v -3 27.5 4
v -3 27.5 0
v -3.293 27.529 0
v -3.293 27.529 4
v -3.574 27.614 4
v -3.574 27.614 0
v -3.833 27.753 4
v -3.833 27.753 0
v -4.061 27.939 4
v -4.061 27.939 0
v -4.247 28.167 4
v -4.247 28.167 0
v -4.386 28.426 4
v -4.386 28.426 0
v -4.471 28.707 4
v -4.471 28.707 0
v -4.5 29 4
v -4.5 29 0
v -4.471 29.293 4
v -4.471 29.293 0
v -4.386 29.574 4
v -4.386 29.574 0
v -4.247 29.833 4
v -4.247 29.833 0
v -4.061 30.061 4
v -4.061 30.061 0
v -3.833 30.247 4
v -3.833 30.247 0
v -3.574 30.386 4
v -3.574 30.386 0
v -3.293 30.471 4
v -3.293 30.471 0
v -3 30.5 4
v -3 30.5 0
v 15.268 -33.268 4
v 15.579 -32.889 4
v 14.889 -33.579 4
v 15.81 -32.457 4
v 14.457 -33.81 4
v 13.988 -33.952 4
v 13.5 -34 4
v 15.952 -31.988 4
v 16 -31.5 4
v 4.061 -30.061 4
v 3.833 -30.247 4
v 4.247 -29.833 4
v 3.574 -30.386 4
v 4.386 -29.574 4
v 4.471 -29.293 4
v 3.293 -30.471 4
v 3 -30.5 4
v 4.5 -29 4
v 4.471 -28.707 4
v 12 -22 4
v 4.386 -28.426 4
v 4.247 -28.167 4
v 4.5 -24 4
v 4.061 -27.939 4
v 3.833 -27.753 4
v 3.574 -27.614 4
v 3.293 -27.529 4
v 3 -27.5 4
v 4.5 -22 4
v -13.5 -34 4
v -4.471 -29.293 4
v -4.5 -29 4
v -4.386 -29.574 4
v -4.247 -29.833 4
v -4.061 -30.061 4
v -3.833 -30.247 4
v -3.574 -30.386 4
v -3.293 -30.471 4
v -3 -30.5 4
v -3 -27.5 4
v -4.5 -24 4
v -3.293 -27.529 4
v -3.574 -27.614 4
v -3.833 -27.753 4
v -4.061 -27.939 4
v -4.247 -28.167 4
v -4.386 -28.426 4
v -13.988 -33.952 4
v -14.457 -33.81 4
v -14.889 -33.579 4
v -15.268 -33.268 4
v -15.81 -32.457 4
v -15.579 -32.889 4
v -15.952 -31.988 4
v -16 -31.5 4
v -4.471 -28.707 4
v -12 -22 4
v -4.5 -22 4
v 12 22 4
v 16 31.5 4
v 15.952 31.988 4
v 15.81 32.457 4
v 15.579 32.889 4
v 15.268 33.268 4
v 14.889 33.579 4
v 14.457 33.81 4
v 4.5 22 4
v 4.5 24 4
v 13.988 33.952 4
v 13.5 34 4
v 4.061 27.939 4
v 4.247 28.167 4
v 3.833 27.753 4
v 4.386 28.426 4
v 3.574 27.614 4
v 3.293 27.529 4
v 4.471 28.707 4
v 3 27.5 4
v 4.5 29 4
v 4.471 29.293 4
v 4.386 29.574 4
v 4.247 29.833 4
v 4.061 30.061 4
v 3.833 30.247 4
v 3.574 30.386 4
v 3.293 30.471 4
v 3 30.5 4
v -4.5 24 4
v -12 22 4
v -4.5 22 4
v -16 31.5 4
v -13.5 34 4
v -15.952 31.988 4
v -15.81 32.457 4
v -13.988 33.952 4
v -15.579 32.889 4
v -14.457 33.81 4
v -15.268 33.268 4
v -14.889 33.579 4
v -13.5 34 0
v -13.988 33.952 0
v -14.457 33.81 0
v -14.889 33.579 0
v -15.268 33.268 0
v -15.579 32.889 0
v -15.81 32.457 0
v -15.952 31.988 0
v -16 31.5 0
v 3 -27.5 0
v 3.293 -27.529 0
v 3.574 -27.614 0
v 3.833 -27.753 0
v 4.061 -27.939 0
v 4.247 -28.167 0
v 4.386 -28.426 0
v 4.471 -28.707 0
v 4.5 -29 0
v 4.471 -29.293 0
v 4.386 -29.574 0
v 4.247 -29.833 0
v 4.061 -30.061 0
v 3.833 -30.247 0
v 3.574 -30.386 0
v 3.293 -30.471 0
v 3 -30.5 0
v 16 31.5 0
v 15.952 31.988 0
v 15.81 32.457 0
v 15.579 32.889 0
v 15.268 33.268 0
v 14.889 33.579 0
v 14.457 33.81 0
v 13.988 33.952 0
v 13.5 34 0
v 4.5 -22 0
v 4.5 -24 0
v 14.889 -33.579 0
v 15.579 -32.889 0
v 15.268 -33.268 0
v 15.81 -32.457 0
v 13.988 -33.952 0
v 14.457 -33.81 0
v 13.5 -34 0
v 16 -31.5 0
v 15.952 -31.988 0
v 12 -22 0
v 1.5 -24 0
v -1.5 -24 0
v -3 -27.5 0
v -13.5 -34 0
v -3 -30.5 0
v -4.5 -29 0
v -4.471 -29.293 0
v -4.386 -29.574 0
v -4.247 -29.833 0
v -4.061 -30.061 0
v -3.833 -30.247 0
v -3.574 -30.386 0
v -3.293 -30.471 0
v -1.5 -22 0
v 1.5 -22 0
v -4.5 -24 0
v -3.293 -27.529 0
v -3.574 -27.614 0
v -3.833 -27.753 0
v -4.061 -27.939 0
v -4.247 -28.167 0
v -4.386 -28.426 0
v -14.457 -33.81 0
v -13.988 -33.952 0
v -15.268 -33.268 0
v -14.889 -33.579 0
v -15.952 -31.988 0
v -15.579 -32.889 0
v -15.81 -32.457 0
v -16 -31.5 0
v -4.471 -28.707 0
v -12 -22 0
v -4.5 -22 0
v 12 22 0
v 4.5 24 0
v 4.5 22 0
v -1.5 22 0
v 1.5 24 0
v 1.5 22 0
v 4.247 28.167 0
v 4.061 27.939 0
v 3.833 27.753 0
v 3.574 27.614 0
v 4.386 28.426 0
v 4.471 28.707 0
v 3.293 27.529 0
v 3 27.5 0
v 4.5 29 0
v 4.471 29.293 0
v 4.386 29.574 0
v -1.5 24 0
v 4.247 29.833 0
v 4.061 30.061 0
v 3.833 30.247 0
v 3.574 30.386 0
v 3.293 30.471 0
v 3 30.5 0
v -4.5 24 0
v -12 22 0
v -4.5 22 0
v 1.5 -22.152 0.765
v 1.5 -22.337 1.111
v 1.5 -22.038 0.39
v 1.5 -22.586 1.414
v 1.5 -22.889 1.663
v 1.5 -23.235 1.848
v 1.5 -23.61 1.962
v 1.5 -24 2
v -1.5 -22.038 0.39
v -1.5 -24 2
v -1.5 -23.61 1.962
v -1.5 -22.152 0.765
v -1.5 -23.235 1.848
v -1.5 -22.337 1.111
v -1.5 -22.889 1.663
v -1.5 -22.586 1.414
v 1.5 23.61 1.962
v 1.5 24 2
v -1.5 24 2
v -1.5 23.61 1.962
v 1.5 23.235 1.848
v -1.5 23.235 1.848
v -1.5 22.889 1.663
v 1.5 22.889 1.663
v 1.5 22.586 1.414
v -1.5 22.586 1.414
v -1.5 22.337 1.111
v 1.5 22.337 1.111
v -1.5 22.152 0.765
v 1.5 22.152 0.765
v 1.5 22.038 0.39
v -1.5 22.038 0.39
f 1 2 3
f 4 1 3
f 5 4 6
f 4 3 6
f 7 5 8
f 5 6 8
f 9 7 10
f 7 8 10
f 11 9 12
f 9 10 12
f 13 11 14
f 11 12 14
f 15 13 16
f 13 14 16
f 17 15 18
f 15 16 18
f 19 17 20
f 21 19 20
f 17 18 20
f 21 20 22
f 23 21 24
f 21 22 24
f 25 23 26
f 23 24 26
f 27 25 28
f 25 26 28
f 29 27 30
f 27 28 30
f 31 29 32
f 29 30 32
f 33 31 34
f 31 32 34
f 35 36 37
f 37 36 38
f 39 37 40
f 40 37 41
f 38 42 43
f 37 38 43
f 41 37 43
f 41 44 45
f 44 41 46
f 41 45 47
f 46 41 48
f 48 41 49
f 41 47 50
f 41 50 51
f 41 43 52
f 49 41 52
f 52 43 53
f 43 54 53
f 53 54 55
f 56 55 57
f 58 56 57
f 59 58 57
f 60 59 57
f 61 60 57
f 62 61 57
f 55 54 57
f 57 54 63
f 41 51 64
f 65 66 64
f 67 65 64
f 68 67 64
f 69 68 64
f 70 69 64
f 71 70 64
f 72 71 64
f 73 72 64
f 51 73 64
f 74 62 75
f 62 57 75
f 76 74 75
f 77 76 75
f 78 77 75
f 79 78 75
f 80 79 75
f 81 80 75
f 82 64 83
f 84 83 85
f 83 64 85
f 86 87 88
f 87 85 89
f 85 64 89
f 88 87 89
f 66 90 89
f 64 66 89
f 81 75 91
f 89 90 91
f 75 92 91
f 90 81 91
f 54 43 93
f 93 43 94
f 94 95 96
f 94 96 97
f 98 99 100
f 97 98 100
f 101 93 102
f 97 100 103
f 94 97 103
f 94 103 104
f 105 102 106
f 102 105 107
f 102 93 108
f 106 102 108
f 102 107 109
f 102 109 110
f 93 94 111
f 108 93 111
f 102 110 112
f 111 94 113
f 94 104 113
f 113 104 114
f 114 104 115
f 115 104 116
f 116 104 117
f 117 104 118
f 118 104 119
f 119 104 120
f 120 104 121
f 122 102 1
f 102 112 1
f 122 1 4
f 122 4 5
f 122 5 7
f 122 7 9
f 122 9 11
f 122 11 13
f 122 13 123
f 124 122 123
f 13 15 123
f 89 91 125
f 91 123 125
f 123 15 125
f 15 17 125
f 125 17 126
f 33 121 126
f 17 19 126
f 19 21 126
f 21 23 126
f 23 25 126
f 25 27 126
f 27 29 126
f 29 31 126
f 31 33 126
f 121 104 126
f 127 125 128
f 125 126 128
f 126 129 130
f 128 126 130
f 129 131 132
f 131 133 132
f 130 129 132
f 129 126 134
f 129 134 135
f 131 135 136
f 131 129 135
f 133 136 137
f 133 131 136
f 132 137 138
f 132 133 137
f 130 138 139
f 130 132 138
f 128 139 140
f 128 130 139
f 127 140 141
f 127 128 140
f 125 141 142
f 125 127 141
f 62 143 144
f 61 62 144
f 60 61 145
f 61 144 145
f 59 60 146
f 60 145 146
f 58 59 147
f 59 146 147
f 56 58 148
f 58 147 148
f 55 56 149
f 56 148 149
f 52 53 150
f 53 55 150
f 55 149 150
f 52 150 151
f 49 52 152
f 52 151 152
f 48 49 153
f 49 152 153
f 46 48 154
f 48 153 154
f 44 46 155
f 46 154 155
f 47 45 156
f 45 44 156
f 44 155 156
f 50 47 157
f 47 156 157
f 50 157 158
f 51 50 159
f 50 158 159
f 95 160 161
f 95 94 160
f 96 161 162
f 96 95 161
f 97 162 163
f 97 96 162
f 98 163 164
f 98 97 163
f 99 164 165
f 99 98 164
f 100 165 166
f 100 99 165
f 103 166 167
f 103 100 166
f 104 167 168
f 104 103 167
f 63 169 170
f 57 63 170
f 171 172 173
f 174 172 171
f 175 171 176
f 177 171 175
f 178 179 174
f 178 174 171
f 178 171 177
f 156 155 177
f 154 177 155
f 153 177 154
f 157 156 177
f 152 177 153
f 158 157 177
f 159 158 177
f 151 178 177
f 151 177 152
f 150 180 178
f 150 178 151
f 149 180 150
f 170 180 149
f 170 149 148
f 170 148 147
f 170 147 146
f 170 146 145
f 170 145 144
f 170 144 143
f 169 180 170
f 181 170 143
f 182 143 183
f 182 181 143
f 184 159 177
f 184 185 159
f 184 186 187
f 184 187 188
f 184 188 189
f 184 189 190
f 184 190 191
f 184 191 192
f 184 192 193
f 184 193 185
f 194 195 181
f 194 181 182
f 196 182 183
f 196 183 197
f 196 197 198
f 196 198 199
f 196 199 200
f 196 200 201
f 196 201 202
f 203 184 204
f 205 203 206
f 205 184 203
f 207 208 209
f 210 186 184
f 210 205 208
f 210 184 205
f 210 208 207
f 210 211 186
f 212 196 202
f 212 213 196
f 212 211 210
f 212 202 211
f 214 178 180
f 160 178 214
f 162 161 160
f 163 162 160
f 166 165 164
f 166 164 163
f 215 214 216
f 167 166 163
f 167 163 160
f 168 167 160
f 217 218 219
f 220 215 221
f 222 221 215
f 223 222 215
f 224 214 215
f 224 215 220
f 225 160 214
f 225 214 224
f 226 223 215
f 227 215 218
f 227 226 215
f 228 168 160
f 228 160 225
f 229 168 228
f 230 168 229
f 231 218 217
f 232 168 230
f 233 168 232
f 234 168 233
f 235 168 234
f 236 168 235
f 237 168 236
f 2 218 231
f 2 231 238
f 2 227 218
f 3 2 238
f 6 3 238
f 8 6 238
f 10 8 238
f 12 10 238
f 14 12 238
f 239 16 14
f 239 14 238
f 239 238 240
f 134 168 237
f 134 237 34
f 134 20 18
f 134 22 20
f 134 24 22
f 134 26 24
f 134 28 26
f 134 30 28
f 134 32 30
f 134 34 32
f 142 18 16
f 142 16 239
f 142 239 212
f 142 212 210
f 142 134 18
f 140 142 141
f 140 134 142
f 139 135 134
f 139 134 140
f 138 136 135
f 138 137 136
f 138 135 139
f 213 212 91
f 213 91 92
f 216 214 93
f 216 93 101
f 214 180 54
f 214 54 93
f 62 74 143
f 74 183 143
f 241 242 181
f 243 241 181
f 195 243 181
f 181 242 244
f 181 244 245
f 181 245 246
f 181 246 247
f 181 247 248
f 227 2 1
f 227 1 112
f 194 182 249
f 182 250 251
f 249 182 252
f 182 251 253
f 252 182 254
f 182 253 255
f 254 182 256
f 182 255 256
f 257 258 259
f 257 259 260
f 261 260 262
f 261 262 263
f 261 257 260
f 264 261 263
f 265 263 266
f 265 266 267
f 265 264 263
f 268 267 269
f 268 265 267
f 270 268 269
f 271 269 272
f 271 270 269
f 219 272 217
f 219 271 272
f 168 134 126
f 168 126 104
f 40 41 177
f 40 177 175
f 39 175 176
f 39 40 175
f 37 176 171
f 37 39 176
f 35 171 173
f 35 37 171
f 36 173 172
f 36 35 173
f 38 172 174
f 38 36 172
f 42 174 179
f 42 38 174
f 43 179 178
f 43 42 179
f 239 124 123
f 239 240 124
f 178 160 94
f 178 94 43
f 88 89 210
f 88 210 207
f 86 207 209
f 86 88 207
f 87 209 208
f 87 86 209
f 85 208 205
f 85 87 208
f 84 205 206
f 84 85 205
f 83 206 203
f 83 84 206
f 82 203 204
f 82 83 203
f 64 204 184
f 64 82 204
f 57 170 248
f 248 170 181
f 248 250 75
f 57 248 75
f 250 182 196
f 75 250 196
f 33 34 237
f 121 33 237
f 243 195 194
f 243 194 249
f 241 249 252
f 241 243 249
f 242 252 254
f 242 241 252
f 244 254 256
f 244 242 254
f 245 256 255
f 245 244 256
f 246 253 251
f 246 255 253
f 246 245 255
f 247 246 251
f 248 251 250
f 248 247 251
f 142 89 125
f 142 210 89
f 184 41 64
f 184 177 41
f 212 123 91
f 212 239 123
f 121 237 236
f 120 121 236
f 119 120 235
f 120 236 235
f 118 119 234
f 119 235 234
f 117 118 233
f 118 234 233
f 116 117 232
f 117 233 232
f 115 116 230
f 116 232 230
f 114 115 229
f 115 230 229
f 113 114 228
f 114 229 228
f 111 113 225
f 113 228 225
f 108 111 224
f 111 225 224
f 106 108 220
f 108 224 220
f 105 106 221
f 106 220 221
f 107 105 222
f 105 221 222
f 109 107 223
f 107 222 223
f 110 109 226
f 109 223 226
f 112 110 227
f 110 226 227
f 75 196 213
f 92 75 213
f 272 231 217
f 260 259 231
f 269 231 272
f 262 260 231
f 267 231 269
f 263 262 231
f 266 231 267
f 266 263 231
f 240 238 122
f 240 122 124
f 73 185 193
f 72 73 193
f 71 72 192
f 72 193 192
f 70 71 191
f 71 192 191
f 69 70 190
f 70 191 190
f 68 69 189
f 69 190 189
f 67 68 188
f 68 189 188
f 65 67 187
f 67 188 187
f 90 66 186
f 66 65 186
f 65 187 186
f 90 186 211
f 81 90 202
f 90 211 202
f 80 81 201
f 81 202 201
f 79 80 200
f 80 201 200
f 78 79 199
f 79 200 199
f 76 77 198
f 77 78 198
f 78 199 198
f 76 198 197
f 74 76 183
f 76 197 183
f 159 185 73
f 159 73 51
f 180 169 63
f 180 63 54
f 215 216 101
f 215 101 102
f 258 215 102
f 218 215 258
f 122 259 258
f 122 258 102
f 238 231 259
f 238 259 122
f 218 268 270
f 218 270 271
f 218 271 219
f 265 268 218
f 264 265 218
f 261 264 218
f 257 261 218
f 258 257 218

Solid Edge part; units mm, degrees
sketch "Sketch1" plane through (0, 0, 0) normal (0, 0, 1) x (1, 0, 0)
  line L0 (-16, 34) -> (16, 34)
  line L1 (16, 34) -> (16, -34)
  line L2 (16, -34) -> (-16, -34)
  line L3 (-16, -34) -> (-16, 34)
  line L4 (-3, 27.5) -> (3, 27.5)
  line L5 (-3, 30.5) -> (3, 30.5)
  arc A0 (3, 30.5) -> (3, 27.5) centre (3, 29) cw
  arc A1 (-3, 27.5) -> (-3, 30.5) centre (-3, 29) cw
  arc A2 (3, -30.5) -> (3, -27.5) centre (3, -29) ccw
  line L6 (-3, -27.5) -> (3, -27.5)
  arc A3 (-3, -27.5) -> (-3, -30.5) centre (-3, -29) ccw
  line L7 (-3, -30.5) -> (3, -30.5)
  line L8 (-12, 20) -> (12, 20)
  line L9 (12, -20) -> (12, 20)
  line L10 (12, -20) -> (-12, -20)
  line L11 (-12, 20) -> (-12, -20)
extrude "Protrusion1" add sketch "Sketch1" along normal blind 4
sketch "Sketch2" plane through (0, 0, 0) normal (0, 0, 1) x (1, 0, 0)
  line L0 (4.5, 24) -> (-4.5, 24)
  line L1 (-4.5, 24) -> (-4.5, 20)
  line L2 (-4.5, 20) -> (4.5, 20)
  line L3 (4.5, 20) -> (4.5, 24)
extrude "ExtrudedCutout_3" cut sketch "Sketch2" along normal blind 4
fillet "Round_2" radius 2.5 4 edges at (16, 34, 2) (-16, 34, 2) (-16, -34, 2) (16, -34, 2)
sketch "Sketch3" plane through (0, 0, 0) normal (0, 0, 1) x (1, 0, 0)
  line L0 (4.5, -24) -> (-4.5, -24)
  line L1 (-4.5, -24) -> (-4.5, -20)
  line L2 (-4.5, -20) -> (4.5, -20)
  line L3 (4.5, -20) -> (4.5, -24)
extrude "ExtrudedCutout_6" cut sketch "Sketch3" along normal blind 17.8081
sketch "Sketch4" plane through (0, 0, 0) normal (0, 0, -1) x (-1, 0, 0)
  line L0 (4.5, 22) -> (12, 22)
  line L1 (12, 22) -> (12, 20)
  line L2 (12, 20) -> (4.5, 20)
  line L3 (4.5, 20) -> (4.5, 22)
  line L4 (-12, 22) -> (-4.5, 22)
  line L5 (-4.5, 22) -> (-4.5, 20)
  line L6 (-4.5, 20) -> (-12, 20)
  line L7 (-12, 20) -> (-12, 22)
  line L8 (12, -22) -> (4.5, -22)
  line L9 (4.5, -22) -> (4.5, -20)
  line L10 (4.5, -20) -> (12, -20)
  line L11 (12, -20) -> (12, -22)
  line L12 (-12, -20) -> (-4.5, -20)
  line L13 (-4.5, -20) -> (-4.5, -22)
  line L14 (-4.5, -22) -> (-12, -22)
  line L15 (-12, -22) -> (-12, -20)
extrude "ExtrudedCutout_7" cut sketch "Sketch4" against normal blind 14.5789
sketch "Sketch5" plane through (-4.5, 22, 2) normal (0, 0, 1) x (1, 0, 0)
  line L0 (3, 0) -> (6, 0)
  line L1 (6, 0) -> (6, 2)
  line L2 (6, 2) -> (3, 2)
  line L3 (3, 2) -> (3, 0)
  line L4 (3, -44) -> (6, -44)
  line L5 (6, -44) -> (6, -46)
  line L6 (6, -46) -> (3, -46)
  line L7 (3, -46) -> (3, -44)
extrude "Protrusion2" add sketch "Sketch5" against normal up to vertex (2 mm away)
fillet "Round_4" radius 2 2 edges at (0, 22, 2) (0, -22, 2)
